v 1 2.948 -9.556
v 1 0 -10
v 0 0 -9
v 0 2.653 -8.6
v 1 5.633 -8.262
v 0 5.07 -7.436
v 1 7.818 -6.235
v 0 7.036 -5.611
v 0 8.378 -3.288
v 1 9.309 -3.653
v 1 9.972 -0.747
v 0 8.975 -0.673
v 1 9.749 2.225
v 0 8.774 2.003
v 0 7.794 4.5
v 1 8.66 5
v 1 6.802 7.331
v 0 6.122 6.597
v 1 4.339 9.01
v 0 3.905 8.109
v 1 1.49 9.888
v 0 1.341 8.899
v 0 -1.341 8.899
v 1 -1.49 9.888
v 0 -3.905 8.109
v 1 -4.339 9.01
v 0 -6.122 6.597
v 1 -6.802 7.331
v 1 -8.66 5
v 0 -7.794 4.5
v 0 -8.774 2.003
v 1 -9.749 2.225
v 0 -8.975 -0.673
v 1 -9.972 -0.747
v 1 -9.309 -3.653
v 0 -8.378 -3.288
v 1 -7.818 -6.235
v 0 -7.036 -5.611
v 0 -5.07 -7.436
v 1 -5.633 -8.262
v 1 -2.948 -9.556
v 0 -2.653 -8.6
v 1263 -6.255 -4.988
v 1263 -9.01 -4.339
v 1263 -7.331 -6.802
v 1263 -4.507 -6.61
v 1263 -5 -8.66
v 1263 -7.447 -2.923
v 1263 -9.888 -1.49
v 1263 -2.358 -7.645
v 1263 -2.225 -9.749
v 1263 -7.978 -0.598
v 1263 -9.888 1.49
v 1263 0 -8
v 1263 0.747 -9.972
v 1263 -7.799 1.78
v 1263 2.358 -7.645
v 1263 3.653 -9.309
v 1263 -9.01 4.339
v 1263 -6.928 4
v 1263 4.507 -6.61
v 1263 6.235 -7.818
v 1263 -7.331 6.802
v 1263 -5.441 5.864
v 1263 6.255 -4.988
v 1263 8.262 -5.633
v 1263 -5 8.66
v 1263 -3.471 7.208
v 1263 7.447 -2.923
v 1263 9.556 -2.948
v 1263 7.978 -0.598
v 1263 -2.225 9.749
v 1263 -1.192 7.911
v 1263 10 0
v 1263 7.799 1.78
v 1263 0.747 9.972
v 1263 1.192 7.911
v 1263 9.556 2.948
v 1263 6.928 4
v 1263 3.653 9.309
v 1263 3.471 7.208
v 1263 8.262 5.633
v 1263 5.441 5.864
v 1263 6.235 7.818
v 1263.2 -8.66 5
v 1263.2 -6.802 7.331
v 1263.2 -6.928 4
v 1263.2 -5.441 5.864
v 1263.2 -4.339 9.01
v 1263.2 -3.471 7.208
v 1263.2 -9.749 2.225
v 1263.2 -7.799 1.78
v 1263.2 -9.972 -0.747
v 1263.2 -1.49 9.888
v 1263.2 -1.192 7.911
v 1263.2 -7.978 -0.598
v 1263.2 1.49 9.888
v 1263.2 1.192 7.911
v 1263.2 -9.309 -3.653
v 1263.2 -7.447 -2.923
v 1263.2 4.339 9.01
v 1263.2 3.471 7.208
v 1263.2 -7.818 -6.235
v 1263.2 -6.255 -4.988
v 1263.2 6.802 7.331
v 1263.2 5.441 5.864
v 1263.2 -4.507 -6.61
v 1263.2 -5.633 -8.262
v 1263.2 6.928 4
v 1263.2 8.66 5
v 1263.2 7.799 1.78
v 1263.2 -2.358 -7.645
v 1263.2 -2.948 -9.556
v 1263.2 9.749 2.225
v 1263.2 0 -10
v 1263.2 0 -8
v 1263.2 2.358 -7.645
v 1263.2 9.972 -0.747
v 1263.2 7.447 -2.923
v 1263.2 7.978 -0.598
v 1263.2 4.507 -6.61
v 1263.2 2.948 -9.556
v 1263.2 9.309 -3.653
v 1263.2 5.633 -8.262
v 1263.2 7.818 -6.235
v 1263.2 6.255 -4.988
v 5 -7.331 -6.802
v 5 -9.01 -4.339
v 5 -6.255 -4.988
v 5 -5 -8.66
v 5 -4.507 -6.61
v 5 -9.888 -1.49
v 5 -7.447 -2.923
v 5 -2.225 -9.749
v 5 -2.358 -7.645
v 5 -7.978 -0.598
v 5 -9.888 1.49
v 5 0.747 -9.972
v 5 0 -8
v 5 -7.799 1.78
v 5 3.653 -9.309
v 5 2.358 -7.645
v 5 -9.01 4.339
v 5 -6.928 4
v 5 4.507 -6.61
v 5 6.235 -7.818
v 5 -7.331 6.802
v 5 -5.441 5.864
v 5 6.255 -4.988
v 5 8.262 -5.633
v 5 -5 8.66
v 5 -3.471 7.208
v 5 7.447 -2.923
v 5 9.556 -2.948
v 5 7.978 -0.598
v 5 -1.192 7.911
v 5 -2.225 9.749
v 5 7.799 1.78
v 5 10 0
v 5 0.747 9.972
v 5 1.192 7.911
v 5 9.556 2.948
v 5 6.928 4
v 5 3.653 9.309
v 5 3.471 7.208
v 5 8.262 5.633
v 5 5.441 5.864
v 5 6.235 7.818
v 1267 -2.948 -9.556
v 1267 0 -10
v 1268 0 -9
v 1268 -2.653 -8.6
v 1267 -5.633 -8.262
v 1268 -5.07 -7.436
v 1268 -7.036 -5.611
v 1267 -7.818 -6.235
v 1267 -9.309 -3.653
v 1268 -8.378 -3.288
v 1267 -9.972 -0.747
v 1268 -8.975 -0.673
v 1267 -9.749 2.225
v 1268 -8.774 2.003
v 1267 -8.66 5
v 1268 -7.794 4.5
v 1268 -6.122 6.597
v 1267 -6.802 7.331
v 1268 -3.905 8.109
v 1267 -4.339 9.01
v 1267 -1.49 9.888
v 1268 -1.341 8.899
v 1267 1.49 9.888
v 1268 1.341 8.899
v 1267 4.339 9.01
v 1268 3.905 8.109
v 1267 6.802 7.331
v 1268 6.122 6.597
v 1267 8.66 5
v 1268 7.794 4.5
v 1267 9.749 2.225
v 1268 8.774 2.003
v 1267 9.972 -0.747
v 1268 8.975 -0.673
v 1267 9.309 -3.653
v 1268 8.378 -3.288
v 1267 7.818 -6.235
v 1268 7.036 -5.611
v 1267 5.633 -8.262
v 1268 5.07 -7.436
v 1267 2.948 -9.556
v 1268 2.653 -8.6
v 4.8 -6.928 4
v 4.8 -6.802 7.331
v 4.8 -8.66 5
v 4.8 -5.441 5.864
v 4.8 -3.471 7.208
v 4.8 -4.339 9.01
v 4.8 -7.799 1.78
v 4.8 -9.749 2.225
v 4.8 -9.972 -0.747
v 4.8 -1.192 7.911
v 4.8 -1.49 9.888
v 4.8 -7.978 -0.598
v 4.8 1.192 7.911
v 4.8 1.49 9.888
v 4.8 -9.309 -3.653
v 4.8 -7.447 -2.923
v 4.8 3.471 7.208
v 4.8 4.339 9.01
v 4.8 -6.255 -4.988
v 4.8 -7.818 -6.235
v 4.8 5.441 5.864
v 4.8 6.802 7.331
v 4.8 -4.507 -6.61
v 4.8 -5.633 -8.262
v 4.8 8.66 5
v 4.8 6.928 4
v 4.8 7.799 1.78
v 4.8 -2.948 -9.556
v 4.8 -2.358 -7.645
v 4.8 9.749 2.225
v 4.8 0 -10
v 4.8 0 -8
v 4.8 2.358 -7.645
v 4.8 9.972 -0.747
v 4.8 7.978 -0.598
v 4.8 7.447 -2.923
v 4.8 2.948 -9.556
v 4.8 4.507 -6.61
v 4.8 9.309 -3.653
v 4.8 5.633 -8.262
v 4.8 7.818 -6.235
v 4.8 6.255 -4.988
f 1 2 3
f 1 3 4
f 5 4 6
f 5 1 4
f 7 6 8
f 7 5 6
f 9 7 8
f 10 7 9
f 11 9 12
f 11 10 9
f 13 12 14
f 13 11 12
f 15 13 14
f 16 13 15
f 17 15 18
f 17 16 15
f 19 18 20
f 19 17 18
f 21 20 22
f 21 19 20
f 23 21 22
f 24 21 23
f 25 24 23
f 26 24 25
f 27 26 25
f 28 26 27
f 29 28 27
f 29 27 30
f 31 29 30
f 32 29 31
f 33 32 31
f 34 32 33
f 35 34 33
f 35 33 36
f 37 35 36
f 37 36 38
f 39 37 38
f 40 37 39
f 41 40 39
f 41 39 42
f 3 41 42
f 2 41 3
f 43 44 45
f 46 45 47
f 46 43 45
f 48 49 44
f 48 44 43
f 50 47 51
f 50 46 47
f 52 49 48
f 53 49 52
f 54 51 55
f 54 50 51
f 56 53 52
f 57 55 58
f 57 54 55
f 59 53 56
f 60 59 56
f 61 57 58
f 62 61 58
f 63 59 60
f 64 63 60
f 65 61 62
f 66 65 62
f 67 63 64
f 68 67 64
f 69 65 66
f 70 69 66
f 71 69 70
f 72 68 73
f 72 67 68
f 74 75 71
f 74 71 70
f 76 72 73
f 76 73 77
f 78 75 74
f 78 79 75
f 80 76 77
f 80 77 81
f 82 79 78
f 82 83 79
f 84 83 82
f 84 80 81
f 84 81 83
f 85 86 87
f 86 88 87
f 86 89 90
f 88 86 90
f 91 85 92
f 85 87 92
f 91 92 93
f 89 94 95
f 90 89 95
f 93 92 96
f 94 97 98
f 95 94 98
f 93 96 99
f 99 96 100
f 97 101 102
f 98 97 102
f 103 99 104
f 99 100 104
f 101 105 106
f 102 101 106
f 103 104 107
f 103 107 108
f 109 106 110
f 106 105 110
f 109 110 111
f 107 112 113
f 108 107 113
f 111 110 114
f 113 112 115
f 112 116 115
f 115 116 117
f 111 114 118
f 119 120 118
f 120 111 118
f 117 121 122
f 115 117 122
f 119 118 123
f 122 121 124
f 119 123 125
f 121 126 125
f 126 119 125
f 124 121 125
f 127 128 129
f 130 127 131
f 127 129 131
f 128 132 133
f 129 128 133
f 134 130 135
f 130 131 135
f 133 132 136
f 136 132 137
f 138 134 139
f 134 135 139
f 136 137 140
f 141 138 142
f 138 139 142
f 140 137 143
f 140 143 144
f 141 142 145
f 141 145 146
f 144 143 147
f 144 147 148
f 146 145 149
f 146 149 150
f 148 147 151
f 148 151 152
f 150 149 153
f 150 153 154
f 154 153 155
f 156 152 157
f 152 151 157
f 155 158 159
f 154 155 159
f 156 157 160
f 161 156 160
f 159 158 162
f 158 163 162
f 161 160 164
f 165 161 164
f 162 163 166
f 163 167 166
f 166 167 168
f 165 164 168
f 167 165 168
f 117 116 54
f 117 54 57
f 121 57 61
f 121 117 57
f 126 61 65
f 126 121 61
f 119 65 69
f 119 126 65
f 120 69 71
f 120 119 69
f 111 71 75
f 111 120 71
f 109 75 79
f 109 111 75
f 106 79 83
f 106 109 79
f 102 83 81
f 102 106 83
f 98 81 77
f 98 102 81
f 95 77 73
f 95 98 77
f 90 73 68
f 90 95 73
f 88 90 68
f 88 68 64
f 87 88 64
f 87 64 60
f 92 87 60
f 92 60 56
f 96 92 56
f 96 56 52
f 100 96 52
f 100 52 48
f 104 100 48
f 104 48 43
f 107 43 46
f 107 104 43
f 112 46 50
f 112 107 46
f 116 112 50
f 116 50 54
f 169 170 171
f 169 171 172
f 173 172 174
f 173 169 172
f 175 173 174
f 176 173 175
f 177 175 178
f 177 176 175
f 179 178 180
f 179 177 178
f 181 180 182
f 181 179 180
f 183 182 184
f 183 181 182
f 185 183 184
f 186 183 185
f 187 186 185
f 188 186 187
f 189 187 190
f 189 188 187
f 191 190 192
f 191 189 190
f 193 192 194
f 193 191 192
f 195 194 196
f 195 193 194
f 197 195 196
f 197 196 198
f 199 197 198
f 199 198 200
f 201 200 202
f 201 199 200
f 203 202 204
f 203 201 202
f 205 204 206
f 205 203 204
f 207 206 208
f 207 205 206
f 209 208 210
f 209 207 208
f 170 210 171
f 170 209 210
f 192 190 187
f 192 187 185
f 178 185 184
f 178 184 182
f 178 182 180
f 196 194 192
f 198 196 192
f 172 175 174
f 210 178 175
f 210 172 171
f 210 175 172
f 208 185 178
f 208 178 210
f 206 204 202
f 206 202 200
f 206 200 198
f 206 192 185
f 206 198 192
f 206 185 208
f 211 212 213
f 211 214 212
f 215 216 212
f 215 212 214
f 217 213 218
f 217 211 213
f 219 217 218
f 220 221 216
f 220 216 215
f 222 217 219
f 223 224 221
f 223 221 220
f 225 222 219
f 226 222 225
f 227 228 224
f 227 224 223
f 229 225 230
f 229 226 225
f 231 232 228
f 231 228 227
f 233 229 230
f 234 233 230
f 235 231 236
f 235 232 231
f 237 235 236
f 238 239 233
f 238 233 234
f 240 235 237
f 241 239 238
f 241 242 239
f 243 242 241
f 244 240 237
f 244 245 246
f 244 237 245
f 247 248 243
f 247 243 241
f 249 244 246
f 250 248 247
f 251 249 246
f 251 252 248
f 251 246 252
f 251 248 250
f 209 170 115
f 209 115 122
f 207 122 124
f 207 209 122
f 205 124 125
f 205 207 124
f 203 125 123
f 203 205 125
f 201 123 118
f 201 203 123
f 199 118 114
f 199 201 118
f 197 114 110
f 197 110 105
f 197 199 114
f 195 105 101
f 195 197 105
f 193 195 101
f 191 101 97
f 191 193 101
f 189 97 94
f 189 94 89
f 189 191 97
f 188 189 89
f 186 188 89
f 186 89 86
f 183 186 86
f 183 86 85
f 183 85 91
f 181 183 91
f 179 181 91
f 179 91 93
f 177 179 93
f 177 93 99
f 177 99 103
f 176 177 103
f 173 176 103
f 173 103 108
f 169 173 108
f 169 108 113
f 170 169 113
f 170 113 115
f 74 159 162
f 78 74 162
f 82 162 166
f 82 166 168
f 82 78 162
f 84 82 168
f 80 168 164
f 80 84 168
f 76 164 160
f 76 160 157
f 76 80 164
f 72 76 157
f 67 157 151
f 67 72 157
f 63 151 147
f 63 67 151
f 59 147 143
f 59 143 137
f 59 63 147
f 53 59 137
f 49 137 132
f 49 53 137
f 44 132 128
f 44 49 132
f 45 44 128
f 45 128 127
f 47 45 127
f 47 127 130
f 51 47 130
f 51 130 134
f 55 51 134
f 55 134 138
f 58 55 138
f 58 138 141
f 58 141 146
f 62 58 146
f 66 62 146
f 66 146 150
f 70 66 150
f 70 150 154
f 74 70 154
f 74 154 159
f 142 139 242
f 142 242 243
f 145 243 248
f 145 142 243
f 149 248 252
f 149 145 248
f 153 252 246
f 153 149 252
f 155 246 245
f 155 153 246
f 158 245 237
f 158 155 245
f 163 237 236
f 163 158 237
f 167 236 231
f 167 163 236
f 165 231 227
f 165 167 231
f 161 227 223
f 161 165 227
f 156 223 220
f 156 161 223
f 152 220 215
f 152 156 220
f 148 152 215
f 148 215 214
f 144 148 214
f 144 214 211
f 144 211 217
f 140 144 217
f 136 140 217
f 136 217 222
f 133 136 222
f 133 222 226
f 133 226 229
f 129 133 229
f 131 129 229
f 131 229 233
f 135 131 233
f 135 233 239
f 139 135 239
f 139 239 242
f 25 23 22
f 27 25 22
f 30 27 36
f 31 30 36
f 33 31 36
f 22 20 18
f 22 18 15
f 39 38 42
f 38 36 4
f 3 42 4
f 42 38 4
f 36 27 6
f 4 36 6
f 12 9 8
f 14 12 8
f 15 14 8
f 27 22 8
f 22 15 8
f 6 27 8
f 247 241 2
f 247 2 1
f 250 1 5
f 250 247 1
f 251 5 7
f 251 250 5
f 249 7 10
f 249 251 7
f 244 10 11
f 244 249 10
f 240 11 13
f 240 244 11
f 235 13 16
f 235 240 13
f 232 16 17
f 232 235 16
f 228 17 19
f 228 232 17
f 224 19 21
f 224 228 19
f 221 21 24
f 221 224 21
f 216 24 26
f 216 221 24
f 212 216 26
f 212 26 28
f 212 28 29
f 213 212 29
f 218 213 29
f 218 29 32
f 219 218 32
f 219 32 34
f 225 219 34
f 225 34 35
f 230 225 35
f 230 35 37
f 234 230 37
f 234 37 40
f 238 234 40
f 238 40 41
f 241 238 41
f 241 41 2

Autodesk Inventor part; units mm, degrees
sketch "Sketch_1" plane through (0, 0, 0) normal (0, 0, 1) x (1, 0, 0)
  line L0 (1263, 0) -> (5, 0)
  line L1 (5, 0) -> (5, 10)
  line L2 (5, 10) -> (1263, 10)
  line L3 (1263, 10) -> (1263, 0)
  line L4 (1263, 0) -> (5, 0)
revolve "Revolution1" add sketch "Sketch_1" angle 360 about axis through (1263, 0, 0) along (1, 0, 0)
thread "Thread1" size "M20x2.5" class "6g" standard "ISO Metric profile" full length
sketch "Sketch_2" plane through (0, 0, 0) normal (0, 1, 0) x (-1, 0, 0)
  line L0 (-5, 0) -> (0, 0)
  line L1 (0, 0) -> (0, -9)
  line L2 (0, -9) -> (-1, -10)
  line L3 (-1, -10) -> (-4.8, -10)
  line L4 (-4.8, -10) -> (-4.8, -8)
  line L5 (-4.8, -8) -> (-5, -8)
  line L6 (-5, -8) -> (-5, 0)
  line L7 (-5, 0) -> (0, 0)
revolve "Revolution2" add sketch "Sketch_2" angle 360 about axis through (5, 0, 0) along (1, 0, 0)
sketch "Sketch_3" plane through (0, 0, 0) normal (0, 1, 0) x (-1, 0, 0)
  line L0 (-1268, 0) -> (-1263, 0)
  line L1 (-1263, 0) -> (-1263, -8)
  line L2 (-1263, -8) -> (-1263.2, -8)
  line L3 (-1263.2, -8) -> (-1263.2, -10)
  line L4 (-1263.2, -10) -> (-1267, -10)
  line L5 (-1267, -10) -> (-1268, -9)
  line L6 (-1268, -9) -> (-1268, 0)
  line L7 (-1268, 0) -> (-1263, 0)
revolve "Revolution3" add sketch "Sketch_3" angle 360 about axis through (1268, 0, 0) along (1, 0, 0)
ref_plane "bnt_s_1_XY" through (0, 0, 0) normal (-1, 0, 0) x (0, 0, -1)
ref_plane "bnt_s_1_YZ" through (0, 0, 0) normal (0, 0, -1) x (0, -1, 0)
ref_plane "bnt_s_1_ZX" through (0, 0, 0) normal (0, -1, 0) x (-1, 0, 0)
properties part number "BNT 2010-2.61200 Shaft"
